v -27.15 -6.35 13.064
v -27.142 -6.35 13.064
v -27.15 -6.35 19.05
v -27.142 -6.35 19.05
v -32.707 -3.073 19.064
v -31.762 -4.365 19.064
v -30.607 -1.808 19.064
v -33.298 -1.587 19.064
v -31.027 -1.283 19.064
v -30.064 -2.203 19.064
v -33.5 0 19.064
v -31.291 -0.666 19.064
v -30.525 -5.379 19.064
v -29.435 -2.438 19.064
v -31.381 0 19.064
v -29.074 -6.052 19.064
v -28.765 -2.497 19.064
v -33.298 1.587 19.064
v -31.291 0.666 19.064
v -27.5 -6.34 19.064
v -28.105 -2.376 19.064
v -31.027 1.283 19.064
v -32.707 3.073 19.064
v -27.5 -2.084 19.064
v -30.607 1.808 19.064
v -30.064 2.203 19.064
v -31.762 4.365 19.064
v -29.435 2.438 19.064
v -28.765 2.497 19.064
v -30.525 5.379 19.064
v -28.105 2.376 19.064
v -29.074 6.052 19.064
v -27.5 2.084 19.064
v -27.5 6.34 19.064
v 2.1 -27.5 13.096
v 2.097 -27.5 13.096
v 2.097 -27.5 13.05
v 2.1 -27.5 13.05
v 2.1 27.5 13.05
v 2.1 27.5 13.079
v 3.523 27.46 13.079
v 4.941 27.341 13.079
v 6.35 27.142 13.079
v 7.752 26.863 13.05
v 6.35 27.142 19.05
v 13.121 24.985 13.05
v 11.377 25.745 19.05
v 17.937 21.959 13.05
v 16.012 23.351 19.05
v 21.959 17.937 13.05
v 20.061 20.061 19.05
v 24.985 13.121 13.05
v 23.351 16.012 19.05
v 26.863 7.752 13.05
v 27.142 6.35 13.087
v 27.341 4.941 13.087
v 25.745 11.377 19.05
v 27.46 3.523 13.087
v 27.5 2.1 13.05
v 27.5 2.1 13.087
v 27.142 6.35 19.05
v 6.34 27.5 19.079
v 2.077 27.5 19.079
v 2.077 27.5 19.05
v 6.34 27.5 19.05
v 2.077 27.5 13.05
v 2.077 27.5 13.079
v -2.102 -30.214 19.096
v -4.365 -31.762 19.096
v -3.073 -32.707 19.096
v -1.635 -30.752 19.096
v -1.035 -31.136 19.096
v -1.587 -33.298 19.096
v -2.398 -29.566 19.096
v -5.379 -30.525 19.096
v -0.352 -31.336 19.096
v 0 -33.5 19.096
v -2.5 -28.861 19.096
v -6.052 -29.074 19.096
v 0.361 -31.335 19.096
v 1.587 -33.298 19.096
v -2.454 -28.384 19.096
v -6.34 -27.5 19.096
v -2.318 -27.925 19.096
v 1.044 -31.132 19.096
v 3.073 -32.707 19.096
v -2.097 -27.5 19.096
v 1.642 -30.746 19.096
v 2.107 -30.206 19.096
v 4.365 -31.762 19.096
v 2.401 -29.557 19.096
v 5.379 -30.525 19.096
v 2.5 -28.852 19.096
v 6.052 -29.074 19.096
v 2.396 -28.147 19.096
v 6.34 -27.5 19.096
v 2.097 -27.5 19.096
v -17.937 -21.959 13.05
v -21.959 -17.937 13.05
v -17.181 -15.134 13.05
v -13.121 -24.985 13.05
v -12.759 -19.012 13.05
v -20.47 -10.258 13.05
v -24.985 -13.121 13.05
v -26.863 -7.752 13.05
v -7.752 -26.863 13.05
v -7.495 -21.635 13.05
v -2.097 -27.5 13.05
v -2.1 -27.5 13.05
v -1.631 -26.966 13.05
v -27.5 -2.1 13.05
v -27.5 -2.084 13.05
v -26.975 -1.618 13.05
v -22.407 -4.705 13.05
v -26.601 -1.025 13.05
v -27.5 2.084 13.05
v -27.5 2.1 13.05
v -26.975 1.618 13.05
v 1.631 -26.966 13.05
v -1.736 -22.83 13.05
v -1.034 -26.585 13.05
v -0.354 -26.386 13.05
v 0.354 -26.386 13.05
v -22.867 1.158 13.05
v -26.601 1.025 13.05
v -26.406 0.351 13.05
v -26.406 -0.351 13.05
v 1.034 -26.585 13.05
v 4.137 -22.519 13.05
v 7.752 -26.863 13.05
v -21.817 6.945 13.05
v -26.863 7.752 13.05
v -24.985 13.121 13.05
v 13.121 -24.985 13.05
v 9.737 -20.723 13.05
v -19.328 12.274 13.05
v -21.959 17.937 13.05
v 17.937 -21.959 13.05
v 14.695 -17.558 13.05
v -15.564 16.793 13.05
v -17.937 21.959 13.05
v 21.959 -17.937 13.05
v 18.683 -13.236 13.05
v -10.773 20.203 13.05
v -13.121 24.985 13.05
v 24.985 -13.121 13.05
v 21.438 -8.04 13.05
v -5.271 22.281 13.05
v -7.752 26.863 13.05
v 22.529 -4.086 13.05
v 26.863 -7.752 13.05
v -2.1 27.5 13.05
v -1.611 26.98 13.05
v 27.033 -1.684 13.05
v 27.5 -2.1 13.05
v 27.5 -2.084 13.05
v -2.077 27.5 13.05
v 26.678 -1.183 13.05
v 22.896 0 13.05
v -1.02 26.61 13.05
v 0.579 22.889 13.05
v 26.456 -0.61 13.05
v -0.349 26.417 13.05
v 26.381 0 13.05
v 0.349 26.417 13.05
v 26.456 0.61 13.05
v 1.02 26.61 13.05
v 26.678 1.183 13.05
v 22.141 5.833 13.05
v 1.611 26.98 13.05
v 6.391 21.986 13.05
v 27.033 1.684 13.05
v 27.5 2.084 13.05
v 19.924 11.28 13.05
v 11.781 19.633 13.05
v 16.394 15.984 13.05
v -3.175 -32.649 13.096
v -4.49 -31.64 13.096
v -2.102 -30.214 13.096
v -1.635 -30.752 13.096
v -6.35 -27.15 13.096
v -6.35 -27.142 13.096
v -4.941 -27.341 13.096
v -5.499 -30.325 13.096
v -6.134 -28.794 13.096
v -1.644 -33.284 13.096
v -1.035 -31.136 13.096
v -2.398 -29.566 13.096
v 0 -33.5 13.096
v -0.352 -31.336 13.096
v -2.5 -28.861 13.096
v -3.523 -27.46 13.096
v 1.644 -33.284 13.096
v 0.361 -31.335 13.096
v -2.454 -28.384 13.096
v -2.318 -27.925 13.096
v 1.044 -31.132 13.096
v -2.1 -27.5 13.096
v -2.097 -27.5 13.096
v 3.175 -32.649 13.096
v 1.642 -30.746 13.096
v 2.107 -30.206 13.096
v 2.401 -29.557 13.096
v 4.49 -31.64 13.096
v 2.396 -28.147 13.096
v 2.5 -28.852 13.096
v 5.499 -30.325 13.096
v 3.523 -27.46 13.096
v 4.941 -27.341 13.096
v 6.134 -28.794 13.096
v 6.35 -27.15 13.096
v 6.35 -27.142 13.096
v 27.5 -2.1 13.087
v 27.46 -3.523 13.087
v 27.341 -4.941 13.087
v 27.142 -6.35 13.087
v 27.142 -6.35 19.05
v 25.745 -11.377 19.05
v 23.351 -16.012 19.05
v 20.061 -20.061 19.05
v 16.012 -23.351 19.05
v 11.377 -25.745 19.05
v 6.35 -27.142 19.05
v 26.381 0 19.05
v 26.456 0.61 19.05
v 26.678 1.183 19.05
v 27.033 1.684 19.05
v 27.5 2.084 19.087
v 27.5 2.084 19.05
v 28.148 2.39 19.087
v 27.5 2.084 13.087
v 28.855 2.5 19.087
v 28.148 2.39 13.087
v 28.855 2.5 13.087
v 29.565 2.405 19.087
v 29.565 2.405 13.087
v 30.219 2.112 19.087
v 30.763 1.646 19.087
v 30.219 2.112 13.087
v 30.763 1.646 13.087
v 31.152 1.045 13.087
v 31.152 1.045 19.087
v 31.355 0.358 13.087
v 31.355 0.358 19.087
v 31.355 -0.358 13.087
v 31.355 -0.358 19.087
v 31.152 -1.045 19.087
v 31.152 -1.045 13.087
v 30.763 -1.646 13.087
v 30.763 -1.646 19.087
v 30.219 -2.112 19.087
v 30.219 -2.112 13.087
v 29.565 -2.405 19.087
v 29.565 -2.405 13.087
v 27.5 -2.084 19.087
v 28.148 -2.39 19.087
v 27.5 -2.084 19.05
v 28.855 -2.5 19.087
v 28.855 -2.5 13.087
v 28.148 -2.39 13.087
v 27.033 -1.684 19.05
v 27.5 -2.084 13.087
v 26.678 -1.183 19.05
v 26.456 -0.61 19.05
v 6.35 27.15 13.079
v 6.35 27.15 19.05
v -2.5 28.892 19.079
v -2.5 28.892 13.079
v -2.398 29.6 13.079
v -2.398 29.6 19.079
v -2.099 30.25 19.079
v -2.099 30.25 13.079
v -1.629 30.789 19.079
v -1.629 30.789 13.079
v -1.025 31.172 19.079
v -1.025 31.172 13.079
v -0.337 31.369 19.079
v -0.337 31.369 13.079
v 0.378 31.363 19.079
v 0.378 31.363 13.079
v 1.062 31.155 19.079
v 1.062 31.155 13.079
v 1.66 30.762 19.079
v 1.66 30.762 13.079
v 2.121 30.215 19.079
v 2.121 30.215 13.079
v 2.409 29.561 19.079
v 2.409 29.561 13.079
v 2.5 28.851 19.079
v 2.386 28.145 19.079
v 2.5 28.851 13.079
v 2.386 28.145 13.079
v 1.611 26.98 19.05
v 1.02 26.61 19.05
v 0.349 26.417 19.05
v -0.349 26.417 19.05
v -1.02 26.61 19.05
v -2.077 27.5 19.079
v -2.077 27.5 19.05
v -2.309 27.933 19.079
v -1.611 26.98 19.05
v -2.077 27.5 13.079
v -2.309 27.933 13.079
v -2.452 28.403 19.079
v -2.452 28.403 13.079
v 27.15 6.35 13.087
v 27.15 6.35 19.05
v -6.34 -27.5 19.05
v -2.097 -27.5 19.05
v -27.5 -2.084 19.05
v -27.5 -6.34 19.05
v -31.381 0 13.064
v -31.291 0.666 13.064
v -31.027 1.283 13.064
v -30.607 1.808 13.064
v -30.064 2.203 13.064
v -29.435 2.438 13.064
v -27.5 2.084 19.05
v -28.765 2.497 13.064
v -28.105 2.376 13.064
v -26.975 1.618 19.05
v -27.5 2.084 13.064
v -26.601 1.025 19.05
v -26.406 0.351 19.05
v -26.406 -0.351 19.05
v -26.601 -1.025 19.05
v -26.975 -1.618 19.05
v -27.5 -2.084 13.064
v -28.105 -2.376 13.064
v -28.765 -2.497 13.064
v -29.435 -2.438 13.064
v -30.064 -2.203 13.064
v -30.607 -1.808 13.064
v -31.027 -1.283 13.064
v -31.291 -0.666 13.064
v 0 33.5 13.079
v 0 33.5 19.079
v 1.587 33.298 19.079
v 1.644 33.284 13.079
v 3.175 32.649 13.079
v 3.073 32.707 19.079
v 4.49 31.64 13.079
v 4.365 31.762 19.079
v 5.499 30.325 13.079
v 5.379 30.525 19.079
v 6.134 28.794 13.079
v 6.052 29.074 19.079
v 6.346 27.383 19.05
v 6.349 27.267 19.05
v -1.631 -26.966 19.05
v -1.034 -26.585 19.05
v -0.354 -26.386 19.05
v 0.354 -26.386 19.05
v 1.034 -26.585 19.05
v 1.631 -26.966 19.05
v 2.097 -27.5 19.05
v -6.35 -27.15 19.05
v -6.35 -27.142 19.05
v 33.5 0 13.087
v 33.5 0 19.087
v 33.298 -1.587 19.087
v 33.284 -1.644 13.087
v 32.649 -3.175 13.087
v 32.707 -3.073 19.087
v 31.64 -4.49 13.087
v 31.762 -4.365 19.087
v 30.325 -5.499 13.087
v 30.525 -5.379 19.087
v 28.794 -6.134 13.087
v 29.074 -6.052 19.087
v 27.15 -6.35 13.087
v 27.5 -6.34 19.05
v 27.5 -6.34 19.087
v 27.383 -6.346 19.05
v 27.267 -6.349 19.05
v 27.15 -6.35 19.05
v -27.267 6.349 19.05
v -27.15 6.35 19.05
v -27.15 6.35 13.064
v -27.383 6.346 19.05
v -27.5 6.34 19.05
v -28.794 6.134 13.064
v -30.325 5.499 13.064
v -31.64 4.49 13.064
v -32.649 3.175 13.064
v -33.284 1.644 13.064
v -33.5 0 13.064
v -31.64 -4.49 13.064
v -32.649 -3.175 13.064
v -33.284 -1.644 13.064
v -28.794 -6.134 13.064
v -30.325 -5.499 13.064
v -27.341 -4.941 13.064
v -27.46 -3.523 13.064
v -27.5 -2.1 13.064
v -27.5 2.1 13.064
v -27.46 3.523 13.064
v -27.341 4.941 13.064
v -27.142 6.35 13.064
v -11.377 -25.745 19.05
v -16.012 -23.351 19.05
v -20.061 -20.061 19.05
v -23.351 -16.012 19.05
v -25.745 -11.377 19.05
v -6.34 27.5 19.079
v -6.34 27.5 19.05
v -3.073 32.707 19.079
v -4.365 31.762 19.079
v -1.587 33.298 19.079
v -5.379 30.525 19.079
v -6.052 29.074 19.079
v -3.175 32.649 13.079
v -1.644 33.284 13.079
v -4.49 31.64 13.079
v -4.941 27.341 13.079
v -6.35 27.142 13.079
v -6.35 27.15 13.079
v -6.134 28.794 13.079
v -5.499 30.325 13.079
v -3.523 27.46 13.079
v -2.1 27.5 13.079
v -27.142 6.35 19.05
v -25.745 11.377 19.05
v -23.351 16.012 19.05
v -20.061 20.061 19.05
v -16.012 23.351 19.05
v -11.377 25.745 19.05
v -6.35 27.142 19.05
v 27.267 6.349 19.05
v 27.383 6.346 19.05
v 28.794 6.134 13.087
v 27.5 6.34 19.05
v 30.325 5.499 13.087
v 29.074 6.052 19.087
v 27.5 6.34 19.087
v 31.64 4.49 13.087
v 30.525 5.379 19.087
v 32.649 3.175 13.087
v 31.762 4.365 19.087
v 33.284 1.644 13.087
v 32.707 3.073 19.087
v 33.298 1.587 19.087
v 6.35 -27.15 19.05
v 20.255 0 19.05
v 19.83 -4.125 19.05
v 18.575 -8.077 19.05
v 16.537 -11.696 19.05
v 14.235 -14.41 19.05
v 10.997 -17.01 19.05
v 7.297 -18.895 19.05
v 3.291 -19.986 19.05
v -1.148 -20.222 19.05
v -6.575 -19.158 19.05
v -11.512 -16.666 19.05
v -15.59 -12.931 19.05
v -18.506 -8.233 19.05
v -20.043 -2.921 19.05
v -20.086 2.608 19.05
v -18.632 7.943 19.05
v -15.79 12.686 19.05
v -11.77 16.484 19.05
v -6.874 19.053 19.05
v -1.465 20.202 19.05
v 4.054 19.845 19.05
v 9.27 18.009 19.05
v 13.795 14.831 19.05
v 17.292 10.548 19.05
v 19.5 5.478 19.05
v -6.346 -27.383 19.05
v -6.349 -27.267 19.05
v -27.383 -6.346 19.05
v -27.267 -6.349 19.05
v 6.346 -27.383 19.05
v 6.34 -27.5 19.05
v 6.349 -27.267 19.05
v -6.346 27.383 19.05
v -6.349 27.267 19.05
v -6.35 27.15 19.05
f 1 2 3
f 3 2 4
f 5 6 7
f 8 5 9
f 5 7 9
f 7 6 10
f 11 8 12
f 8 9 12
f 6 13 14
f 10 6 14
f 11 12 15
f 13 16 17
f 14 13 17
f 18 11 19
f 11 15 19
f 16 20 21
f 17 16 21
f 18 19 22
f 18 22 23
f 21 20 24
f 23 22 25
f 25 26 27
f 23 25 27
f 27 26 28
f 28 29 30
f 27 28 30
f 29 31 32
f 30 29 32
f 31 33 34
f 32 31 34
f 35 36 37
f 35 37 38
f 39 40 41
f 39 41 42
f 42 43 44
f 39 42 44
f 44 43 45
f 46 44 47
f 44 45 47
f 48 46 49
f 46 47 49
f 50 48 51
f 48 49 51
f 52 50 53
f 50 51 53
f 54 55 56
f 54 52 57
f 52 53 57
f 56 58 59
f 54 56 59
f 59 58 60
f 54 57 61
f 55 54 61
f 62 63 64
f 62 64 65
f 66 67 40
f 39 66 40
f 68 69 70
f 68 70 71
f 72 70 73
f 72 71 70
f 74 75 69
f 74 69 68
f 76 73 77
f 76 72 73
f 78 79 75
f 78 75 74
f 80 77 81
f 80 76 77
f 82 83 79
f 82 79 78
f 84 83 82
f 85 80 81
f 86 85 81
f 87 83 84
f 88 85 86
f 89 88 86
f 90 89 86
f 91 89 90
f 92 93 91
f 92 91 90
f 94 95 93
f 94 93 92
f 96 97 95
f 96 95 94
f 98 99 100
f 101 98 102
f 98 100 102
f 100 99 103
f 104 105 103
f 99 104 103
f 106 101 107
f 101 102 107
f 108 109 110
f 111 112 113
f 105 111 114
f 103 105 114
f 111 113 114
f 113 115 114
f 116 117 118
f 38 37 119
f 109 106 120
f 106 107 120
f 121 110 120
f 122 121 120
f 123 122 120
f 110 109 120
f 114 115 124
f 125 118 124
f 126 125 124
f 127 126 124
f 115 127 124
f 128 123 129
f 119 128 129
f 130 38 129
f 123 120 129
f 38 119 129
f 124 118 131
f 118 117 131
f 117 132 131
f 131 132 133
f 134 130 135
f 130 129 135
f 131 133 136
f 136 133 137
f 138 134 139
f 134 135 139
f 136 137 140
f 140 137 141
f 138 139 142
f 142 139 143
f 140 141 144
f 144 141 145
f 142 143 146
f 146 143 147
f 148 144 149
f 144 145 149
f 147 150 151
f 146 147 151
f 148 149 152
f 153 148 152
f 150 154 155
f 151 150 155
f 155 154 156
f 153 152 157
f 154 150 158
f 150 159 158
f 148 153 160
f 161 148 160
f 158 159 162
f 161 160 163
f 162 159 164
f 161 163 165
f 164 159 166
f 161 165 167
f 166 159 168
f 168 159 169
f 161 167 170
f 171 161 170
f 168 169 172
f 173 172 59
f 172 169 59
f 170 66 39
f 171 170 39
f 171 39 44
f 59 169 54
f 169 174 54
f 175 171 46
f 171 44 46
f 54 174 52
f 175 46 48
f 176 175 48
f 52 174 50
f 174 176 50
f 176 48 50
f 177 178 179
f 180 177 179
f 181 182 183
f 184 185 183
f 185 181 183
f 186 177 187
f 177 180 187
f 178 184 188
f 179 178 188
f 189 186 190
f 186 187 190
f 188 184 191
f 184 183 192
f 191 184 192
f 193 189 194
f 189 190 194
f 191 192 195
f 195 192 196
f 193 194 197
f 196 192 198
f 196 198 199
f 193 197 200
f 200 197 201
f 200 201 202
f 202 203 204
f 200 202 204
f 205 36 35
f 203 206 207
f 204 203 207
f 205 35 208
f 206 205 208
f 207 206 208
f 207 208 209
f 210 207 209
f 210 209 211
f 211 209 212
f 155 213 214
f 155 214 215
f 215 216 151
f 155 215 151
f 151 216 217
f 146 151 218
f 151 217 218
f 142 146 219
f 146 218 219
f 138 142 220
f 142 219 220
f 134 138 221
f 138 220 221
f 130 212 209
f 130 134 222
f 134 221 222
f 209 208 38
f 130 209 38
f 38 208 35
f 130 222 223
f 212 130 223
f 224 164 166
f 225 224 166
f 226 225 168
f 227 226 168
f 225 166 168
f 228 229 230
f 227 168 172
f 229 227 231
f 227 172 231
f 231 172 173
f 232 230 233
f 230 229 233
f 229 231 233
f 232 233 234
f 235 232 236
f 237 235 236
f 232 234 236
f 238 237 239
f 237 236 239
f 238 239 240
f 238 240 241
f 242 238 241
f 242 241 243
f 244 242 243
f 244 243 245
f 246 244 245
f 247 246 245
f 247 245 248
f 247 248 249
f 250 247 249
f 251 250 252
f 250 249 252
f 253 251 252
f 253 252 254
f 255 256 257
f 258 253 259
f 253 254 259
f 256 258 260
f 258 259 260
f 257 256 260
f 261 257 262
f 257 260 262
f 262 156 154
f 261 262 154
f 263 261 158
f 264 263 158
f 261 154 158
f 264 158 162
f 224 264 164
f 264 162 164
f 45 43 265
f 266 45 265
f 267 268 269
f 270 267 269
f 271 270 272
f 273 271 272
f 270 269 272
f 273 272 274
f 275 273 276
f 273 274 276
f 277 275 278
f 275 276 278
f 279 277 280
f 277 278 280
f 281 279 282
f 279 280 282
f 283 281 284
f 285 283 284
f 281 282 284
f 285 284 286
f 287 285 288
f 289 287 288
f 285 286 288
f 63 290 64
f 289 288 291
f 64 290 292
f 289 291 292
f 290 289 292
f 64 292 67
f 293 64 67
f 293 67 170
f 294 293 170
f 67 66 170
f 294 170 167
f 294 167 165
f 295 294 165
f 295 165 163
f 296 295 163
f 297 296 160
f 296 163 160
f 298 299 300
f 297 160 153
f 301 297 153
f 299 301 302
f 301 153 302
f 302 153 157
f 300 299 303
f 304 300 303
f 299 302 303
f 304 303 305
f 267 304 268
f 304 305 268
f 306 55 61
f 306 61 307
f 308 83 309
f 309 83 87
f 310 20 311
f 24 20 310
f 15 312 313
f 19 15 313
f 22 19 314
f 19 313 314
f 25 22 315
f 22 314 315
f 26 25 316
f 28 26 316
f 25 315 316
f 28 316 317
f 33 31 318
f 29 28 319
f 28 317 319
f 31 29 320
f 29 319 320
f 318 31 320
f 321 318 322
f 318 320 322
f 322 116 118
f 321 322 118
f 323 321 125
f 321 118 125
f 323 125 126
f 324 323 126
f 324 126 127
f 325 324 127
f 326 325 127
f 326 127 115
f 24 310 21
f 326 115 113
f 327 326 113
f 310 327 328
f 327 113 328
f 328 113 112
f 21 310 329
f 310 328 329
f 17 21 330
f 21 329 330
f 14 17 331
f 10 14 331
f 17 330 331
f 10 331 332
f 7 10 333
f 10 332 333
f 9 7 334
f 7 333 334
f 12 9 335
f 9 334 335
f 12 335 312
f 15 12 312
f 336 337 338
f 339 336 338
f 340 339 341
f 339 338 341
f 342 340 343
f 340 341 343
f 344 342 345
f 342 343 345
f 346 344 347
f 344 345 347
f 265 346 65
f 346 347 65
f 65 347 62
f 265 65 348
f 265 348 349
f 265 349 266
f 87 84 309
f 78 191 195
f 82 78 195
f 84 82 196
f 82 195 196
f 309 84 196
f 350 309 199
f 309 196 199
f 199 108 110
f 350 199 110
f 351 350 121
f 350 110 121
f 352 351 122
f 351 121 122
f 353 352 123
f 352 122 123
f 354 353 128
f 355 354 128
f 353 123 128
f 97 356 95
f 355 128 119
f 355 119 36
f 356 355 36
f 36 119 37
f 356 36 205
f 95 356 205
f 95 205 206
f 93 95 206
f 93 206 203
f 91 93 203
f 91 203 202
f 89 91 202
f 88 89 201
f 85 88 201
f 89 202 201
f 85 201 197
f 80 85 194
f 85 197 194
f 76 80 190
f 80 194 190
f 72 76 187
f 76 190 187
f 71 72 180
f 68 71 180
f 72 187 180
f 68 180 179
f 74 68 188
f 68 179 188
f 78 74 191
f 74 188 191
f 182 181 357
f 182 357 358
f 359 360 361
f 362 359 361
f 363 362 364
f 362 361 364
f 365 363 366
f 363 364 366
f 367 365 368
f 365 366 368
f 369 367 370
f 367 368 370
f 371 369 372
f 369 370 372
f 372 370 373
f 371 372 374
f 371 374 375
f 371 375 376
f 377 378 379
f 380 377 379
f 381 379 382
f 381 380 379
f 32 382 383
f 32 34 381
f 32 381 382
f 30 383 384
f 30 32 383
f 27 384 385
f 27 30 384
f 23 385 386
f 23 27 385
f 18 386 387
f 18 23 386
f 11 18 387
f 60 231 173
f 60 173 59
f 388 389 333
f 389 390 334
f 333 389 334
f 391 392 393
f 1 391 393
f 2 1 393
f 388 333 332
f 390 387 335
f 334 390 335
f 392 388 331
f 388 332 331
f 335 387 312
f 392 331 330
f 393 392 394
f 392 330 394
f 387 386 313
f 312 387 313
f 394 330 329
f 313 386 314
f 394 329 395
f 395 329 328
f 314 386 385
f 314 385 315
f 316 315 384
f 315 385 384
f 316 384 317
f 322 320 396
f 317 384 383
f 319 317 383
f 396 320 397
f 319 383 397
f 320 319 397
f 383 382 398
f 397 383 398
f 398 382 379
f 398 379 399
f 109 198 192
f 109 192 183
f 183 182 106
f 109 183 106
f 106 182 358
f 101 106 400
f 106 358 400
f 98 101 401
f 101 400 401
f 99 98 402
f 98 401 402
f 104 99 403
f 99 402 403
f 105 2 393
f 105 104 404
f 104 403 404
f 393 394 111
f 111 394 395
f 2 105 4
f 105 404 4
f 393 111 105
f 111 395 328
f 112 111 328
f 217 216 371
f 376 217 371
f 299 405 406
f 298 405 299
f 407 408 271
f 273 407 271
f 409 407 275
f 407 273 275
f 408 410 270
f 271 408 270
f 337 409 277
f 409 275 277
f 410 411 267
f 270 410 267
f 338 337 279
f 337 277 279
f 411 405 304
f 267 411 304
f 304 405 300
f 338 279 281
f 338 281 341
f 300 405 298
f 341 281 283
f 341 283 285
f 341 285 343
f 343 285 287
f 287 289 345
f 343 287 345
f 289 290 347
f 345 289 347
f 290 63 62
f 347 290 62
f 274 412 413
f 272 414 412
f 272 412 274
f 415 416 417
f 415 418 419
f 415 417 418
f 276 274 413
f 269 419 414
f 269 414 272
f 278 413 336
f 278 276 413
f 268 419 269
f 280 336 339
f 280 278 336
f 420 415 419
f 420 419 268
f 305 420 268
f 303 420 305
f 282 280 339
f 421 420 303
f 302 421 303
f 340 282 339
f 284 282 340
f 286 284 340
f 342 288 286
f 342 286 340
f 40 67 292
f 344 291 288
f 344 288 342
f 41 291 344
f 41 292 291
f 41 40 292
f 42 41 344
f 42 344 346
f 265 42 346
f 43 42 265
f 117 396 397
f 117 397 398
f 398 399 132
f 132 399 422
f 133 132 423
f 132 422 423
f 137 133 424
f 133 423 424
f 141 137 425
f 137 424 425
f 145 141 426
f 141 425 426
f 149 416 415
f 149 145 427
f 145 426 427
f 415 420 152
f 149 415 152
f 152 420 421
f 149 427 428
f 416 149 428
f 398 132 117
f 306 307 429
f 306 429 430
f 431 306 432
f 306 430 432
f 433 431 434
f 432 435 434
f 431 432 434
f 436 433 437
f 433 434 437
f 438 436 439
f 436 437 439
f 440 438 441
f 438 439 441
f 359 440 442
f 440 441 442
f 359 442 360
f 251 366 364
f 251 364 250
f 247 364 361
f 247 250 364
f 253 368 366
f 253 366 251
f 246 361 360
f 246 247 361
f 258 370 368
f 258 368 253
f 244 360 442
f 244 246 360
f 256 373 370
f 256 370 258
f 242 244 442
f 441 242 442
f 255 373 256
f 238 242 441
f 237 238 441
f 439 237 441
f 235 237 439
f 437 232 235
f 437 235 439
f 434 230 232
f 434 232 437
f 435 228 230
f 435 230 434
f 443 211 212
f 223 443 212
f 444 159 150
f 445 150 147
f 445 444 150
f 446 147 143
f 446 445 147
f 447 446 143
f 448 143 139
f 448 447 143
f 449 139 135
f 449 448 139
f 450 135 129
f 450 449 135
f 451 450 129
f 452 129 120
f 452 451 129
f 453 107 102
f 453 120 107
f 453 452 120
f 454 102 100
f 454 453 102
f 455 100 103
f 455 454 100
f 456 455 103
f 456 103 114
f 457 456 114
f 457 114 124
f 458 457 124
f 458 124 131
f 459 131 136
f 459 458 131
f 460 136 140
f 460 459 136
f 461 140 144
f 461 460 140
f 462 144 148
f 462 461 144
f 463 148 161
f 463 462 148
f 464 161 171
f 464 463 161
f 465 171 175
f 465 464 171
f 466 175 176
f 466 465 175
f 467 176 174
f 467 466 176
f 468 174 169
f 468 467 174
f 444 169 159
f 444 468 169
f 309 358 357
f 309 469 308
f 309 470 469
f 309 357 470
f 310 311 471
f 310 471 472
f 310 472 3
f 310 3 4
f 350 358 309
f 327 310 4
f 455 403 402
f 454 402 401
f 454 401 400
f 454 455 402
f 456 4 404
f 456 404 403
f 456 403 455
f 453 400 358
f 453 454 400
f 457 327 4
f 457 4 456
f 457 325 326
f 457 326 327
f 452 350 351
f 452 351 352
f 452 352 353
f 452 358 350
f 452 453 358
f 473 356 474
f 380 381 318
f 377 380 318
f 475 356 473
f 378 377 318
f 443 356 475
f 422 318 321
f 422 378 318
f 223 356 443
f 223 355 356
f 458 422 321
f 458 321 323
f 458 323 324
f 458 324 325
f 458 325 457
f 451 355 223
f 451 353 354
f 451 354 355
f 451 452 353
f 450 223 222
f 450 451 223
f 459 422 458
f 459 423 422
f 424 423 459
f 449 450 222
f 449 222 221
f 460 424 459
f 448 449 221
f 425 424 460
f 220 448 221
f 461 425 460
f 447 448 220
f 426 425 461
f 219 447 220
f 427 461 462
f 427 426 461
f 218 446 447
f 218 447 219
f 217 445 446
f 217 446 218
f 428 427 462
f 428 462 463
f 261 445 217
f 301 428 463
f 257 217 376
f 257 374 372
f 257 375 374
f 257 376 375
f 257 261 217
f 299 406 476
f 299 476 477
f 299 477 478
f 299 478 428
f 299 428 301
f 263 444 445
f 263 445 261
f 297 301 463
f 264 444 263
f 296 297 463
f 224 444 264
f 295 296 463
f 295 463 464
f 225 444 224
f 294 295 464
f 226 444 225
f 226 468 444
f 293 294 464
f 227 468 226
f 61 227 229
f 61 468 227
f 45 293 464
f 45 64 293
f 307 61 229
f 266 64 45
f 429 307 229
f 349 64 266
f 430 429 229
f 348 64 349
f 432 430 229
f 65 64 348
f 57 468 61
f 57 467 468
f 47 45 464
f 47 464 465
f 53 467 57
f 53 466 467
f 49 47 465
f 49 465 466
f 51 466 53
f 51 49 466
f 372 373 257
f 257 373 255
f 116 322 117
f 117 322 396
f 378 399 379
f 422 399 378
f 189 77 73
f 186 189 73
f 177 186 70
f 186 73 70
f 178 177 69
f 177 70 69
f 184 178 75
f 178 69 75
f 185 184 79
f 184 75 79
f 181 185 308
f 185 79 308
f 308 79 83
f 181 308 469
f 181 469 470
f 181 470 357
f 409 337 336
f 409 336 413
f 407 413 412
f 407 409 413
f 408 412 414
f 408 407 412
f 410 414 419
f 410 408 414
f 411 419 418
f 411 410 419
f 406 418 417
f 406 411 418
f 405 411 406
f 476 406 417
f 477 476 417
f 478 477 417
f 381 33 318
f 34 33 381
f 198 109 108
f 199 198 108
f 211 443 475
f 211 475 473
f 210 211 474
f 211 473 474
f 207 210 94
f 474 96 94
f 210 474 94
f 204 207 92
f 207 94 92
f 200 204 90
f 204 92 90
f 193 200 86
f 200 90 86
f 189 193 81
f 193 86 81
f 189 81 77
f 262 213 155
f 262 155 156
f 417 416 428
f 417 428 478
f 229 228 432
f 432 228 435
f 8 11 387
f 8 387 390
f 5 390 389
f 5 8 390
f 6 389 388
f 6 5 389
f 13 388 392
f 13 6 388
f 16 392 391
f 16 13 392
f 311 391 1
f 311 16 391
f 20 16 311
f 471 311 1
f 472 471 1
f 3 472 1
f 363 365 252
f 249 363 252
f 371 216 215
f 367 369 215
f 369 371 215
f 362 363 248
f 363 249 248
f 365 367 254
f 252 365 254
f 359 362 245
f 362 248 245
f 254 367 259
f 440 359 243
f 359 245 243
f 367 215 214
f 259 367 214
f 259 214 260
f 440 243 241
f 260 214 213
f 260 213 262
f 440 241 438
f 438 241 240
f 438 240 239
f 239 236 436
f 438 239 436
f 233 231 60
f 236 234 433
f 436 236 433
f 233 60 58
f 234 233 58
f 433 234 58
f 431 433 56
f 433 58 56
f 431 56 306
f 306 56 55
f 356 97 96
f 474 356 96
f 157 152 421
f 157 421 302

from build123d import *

# Parameters (mm, degrees)
F3_W          = 55
F3_H          = 55
F4_DEPTH      = 6
F7_W          = 12.7
F7_H          = 6
F8_DEPTH      = 6
F10_W         = 12.7
F10_H         = 6
F11_DEPTH     = 6
F13_W         = 12.7
F13_H         = 6
F14_DEPTH     = 6
F16_W         = 12.7
F16_H         = 6
F17_DEPTH     = 6
F19_D         = 5
F21_D         = 5
F23_D         = 5
F25_D         = 5
F26_T4_DEPTH  = 133
F26_T10_DEPTH = 133
F26_T15_DEPTH = 133
F26_T21_DEPTH = 133
F26_T27_DEPTH = 133
F26_T33_DEPTH = 133
F26_T38_DEPTH = 133
F26_T44_DEPTH = 133
F26_T49_DEPTH = 133
F26_T55_DEPTH = 133
F26_T61_DEPTH = 133
F26_T66_DEPTH = 133
F27_R         = 6.34999


# Not quite as in the source:
# - a fillet or chamfer that OpenCascade refuses, or shapes differently, is made with other operations: its cross-section is extruded or revolved along the edge and cut away or added
# - a fillet or chamfer is up to 0.001 mm smaller than in the source, because OpenCascade refuses the exact size


with BuildPart() as f1:
    # F0 (on Front) → F1 (revolve)
    with BuildSketch(Plane.XZ):
        with BuildLine():
            Line((0, 0), (0, -32.5))
            add(Edge.make_bspline(
                [(0, -32.5), (25, -32.5), (25, 0)],
                knots=[0, 0, 0, 1.5707963268, 1.5707963268, 1.5707963268], degree=2, weights=[1, 0.7071067812, 1]))
            Line((25, 0), (0, 0))
        make_face()
        with BuildLine():
            Line((0, 0), (25, 0))
            add(Edge.make_bspline(
                [(25, 0), (25, 32.5), (0, 32.5)],
                knots=[1.5707963268, 1.5707963268, 1.5707963268, 3.1415926536, 3.1415926536, 3.1415926536], degree=2, weights=[1, 0.7071067812, 1]))
            Line((0, 32.5), (0, 0))
        make_face()
    revolve(axis=Axis((0, 0, 0), (0, 0, -1)))


with BuildPart() as f4:
    # F3 (on offset) → F4 (new body)
    with BuildSketch(Plane.XY.offset(19.05)):
        Rectangle(F3_W, F3_H)
    extrude(amount=-F4_DEPTH)

    # F5: cut F1
    add(f1.part, mode=Mode.SUBTRACT)

    # F7 (on offset) → F8 (join)
    with BuildSketch(Plane.XZ.offset(27.5)):
        with Locations((0, 16.0963926464)):
            Rectangle(F7_W, F7_H)
    extrude(amount=F8_DEPTH)

    # F10 (on offset) → F11 (join)
    with BuildSketch(Plane.YZ.offset(27.5)):
        with Locations((0, 16.087366268)):
            Rectangle(F10_W, F10_H)
    extrude(amount=F11_DEPTH)

    # F13 (on offset) → F14 (join)
    with BuildSketch(Plane.XZ.offset(-27.5)):
        with Locations((0, 16.07888937)):
            Rectangle(F13_W, F13_H)
    extrude(amount=-F14_DEPTH)

    # F16 (on offset) → F17 (join)
    with BuildSketch(Plane.YZ.offset(-27.5)):
        with Locations((0, 16.0636380315)):
            Rectangle(F16_W, F16_H)
    extrude(amount=-F17_DEPTH)

    # F19 (through all)
    with Locations(Plane.XY.offset(19.07888937)):
        with Locations((0, 28.8921689615)):
            Hole(F19_D / 2)

    # F21 (through all)
    with Locations(Plane.XY.offset(19.0636380315)):
        with Locations((-28.8809893653, 0)):
            Hole(F21_D / 2)

    # F23 (through all)
    with Locations(Plane.XY.offset(19.087366268)):
        with Locations((28.8808012381, 0)):
            Hole(F23_D / 2)

    # F25 (through all)
    with Locations(Plane.XY.offset(19.0963926464)):
        with Locations((0, -28.8607433438)):
            Hole(F25_D / 2)

    # F26: fillet of radius 25.4 on 4 edges, made by hand


with BuildPart() as f26_tool2:
    # F26_s3 → F26_t4 (new body)
    with BuildSketch(Plane.XY.offset(82.55)):
        with BuildLine():
            ThreePointArc((-27.5, 2.1), (-20.0605122421, 20.0605122421), (-2.1, 27.5))
            Line((-2.1, 27.5), (-27.5, 27.5))
            Line((-27.5, 27.5), (-27.5, 2.1))
        make_face()
    extrude(amount=-F26_T4_DEPTH)

    split(bisect_by=Plane.XZ.offset(-6.35), keep=Keep.BOTTOM)

    split(bisect_by=Plane.YZ.offset(-6.35), keep=Keep.BOTTOM)


with BuildPart() as f4_1:
    add(f4.part)

    # F26_t1: cut F26_tool2
    add(f26_tool2.part, mode=Mode.SUBTRACT)


with BuildPart() as f26_tool8:
    # F26_s9 → F26_t10 (new body)
    with BuildSketch(Plane.XY.offset(82.55)):
        with BuildLine():
            ThreePointArc((-27.5, 2.1), (-20.0605122421, 20.0605122421), (-2.1, 27.5))
            Line((-2.1, 27.5), (-27.5, 27.5))
            Line((-27.5, 27.5), (-27.5, 2.1))
        make_face()
    extrude(amount=-F26_T10_DEPTH)

    split(bisect_by=Plane.XY.offset(13.0636380315), keep=Keep.BOTTOM)


with BuildPart() as f4_2:
    add(f4_1.part)

    # F26_t7: cut F26_tool8
    add(f26_tool8.part, mode=Mode.SUBTRACT)


with BuildPart() as f26_tool13:
    # F26_s14 → F26_t15 (new body)
    with BuildSketch(Plane.XY.offset(82.55)):
        with BuildLine():
            ThreePointArc((-27.5, 2.1), (-20.0605122421, 20.0605122421), (-2.1, 27.5))
            Line((-2.1, 27.5), (-27.5, 27.5))
            Line((-27.5, 27.5), (-27.5, 2.1))
        make_face()
    extrude(amount=-F26_T15_DEPTH)

    split(bisect_by=Plane.XY.offset(13.07888937), keep=Keep.BOTTOM)

    split(bisect_by=Plane.YZ.offset(-6.35), keep=Keep.TOP)


with BuildPart() as f4_3:
    add(f4_2.part)

    # F26_t12: cut F26_tool13
    add(f26_tool13.part, mode=Mode.SUBTRACT)


with BuildPart() as f26_tool19:
    # F26_s20 → F26_t21 (new body)
    with BuildSketch(Plane.XY.offset(82.55)):
        with BuildLine():
            ThreePointArc((-2.1, -27.5), (-20.0605122421, -20.0605122421), (-27.5, -2.1))
            Line((-27.5, -2.1), (-27.5, -27.5))
            Line((-27.5, -27.5), (-2.1, -27.5))
        make_face()
    extrude(amount=-F26_T21_DEPTH)

    split(bisect_by=Plane.YZ.offset(-6.35), keep=Keep.BOTTOM)

    split(bisect_by=Plane.XZ.offset(6.35), keep=Keep.TOP)


with BuildPart() as f4_4:
    add(f4_3.part)

    # F26_t18: cut F26_tool19
    add(f26_tool19.part, mode=Mode.SUBTRACT)


with BuildPart() as f26_tool25:
    # F26_s26 → F26_t27 (new body)
    with BuildSketch(Plane.XY.offset(82.55)):
        with BuildLine():
            ThreePointArc((-2.1, -27.5), (-20.0605122421, -20.0605122421), (-27.5, -2.1))
            Line((-27.5, -2.1), (-27.5, -27.5))
            Line((-27.5, -27.5), (-2.1, -27.5))
        make_face()
    extrude(amount=-F26_T27_DEPTH)

    split(bisect_by=Plane.XY.offset(13.0963926464), keep=Keep.BOTTOM)

    split(bisect_by=Plane.XZ.offset(6.35), keep=Keep.TOP)


with BuildPart() as f4_5:
    add(f4_4.part)

    # F26_t24: cut F26_tool25
    add(f26_tool25.part, mode=Mode.SUBTRACT)


with BuildPart() as f26_tool31:
    # F26_s32 → F26_t33 (new body)
    with BuildSketch(Plane.XY.offset(82.55)):
        with BuildLine():
            ThreePointArc((-2.1, -27.5), (-20.0605122421, -20.0605122421), (-27.5, -2.1))
            Line((-27.5, -2.1), (-27.5, -27.5))
            Line((-27.5, -27.5), (-2.1, -27.5))
        make_face()
    extrude(amount=-F26_T33_DEPTH)

    split(bisect_by=Plane.XY.offset(13.0636380315), keep=Keep.BOTTOM)


with BuildPart() as f4_6:
    add(f4_5.part)

    # F26_t30: cut F26_tool31
    add(f26_tool31.part, mode=Mode.SUBTRACT)


with BuildPart() as f26_tool36:
    # F26_s37 → F26_t38 (new body)
    with BuildSketch(Plane.XY.offset(82.55)):
        with BuildLine():
            ThreePointArc((27.5, -2.1), (20.0605122421, -20.0605122421), (2.1, -27.5))
            Line((2.1, -27.5), (27.5, -27.5))
            Line((27.5, -27.5), (27.5, -2.1))
        make_face()
    extrude(amount=-F26_T38_DEPTH)

    split(bisect_by=Plane.YZ.offset(6.35), keep=Keep.TOP)

    split(bisect_by=Plane.XZ.offset(6.35), keep=Keep.TOP)


with BuildPart() as f4_7:
    add(f4_6.part)

    # F26_t35: cut F26_tool36
    add(f26_tool36.part, mode=Mode.SUBTRACT)


with BuildPart() as f26_tool42:
    # F26_s43 → F26_t44 (new body)
    with BuildSketch(Plane.XY.offset(82.55)):
        with BuildLine():
            ThreePointArc((27.5, -2.1), (20.0605122421, -20.0605122421), (2.1, -27.5))
            Line((2.1, -27.5), (27.5, -27.5))
            Line((27.5, -27.5), (27.5, -2.1))
        make_face()
    extrude(amount=-F26_T44_DEPTH)

    split(bisect_by=Plane.XY.offset(13.087366268), keep=Keep.BOTTOM)


with BuildPart() as f4_8:
    add(f4_7.part)

    # F26_t41: cut F26_tool42
    add(f26_tool42.part, mode=Mode.SUBTRACT)


with BuildPart() as f26_tool47:
    # F26_s48 → F26_t49 (new body)
    with BuildSketch(Plane.XY.offset(82.55)):
        with BuildLine():
            ThreePointArc((27.5, -2.1), (20.0605122421, -20.0605122421), (2.1, -27.5))
            Line((2.1, -27.5), (27.5, -27.5))
            Line((27.5, -27.5), (27.5, -2.1))
        make_face()
    extrude(amount=-F26_T49_DEPTH)

    split(bisect_by=Plane.XY.offset(13.0963926464), keep=Keep.BOTTOM)

    split(bisect_by=Plane.XZ.offset(6.35), keep=Keep.TOP)


with BuildPart() as f4_9:
    add(f4_8.part)

    # F26_t46: cut F26_tool47
    add(f26_tool47.part, mode=Mode.SUBTRACT)


with BuildPart() as f26_tool53:
    # F26_s54 → F26_t55 (new body)
    with BuildSketch(Plane.XY.offset(82.55)):
        with BuildLine():
            ThreePointArc((2.1, 27.5), (20.0605122421, 20.0605122421), (27.5, 2.1))
            Line((27.5, 2.1), (27.5, 27.5))
            Line((27.5, 27.5), (2.1, 27.5))
        make_face()
    extrude(amount=-F26_T55_DEPTH)

    split(bisect_by=Plane.YZ.offset(6.35), keep=Keep.TOP)

    split(bisect_by=Plane.XZ.offset(-6.35), keep=Keep.BOTTOM)


with BuildPart() as f4_10:
    add(f4_9.part)

    # F26_t52: cut F26_tool53
    add(f26_tool53.part, mode=Mode.SUBTRACT)


with BuildPart() as f26_tool59:
    # F26_s60 → F26_t61 (new body)
    with BuildSketch(Plane.XY.offset(82.55)):
        with BuildLine():
            ThreePointArc((2.1, 27.5), (20.0605122421, 20.0605122421), (27.5, 2.1))
            Line((27.5, 2.1), (27.5, 27.5))
            Line((27.5, 27.5), (2.1, 27.5))
        make_face()
    extrude(amount=-F26_T61_DEPTH)

    split(bisect_by=Plane.XY.offset(13.07888937), keep=Keep.BOTTOM)


with BuildPart() as f4_11:
    add(f4_10.part)

    # F26_t58: cut F26_tool59
    add(f26_tool59.part, mode=Mode.SUBTRACT)


with BuildPart() as f26_tool64:
    # F26_s65 → F26_t66 (new body)
    with BuildSketch(Plane.XY.offset(82.55)):
        with BuildLine():
            ThreePointArc((2.1, 27.5), (20.0605122421, 20.0605122421), (27.5, 2.1))
            Line((27.5, 2.1), (27.5, 27.5))
            Line((27.5, 27.5), (2.1, 27.5))
        make_face()
    extrude(amount=-F26_T66_DEPTH)

    split(bisect_by=Plane.XY.offset(13.087366268), keep=Keep.BOTTOM)

    split(bisect_by=Plane.XZ.offset(-6.35), keep=Keep.TOP)


with BuildPart() as f4_12:
    add(f4_11.part)

    # F26_t63: cut F26_tool64
    add(f26_tool64.part, mode=Mode.SUBTRACT)

    # F27 (radius 6.35 in the source; OpenCascade refuses exactly that, so slightly less here)
    f27_edges = [f4_12.edges().sort_by_distance(p)[0] for p in [
        (6.35, 33.5, 16.078889),
        (-6.35, 33.5, 16.078889),
        (-33.5, 6.35, 16.063638),
        (-33.5, -6.35, 16.063638),
        (-6.35, -33.5, 16.096393),
        (6.35, -33.5, 16.096393),
        (33.5, -6.35, 16.087366),
        (33.5, 6.35, 16.087366),
    ]]
    fillet(f27_edges, radius=F27_R)


solid = f4_12.part
